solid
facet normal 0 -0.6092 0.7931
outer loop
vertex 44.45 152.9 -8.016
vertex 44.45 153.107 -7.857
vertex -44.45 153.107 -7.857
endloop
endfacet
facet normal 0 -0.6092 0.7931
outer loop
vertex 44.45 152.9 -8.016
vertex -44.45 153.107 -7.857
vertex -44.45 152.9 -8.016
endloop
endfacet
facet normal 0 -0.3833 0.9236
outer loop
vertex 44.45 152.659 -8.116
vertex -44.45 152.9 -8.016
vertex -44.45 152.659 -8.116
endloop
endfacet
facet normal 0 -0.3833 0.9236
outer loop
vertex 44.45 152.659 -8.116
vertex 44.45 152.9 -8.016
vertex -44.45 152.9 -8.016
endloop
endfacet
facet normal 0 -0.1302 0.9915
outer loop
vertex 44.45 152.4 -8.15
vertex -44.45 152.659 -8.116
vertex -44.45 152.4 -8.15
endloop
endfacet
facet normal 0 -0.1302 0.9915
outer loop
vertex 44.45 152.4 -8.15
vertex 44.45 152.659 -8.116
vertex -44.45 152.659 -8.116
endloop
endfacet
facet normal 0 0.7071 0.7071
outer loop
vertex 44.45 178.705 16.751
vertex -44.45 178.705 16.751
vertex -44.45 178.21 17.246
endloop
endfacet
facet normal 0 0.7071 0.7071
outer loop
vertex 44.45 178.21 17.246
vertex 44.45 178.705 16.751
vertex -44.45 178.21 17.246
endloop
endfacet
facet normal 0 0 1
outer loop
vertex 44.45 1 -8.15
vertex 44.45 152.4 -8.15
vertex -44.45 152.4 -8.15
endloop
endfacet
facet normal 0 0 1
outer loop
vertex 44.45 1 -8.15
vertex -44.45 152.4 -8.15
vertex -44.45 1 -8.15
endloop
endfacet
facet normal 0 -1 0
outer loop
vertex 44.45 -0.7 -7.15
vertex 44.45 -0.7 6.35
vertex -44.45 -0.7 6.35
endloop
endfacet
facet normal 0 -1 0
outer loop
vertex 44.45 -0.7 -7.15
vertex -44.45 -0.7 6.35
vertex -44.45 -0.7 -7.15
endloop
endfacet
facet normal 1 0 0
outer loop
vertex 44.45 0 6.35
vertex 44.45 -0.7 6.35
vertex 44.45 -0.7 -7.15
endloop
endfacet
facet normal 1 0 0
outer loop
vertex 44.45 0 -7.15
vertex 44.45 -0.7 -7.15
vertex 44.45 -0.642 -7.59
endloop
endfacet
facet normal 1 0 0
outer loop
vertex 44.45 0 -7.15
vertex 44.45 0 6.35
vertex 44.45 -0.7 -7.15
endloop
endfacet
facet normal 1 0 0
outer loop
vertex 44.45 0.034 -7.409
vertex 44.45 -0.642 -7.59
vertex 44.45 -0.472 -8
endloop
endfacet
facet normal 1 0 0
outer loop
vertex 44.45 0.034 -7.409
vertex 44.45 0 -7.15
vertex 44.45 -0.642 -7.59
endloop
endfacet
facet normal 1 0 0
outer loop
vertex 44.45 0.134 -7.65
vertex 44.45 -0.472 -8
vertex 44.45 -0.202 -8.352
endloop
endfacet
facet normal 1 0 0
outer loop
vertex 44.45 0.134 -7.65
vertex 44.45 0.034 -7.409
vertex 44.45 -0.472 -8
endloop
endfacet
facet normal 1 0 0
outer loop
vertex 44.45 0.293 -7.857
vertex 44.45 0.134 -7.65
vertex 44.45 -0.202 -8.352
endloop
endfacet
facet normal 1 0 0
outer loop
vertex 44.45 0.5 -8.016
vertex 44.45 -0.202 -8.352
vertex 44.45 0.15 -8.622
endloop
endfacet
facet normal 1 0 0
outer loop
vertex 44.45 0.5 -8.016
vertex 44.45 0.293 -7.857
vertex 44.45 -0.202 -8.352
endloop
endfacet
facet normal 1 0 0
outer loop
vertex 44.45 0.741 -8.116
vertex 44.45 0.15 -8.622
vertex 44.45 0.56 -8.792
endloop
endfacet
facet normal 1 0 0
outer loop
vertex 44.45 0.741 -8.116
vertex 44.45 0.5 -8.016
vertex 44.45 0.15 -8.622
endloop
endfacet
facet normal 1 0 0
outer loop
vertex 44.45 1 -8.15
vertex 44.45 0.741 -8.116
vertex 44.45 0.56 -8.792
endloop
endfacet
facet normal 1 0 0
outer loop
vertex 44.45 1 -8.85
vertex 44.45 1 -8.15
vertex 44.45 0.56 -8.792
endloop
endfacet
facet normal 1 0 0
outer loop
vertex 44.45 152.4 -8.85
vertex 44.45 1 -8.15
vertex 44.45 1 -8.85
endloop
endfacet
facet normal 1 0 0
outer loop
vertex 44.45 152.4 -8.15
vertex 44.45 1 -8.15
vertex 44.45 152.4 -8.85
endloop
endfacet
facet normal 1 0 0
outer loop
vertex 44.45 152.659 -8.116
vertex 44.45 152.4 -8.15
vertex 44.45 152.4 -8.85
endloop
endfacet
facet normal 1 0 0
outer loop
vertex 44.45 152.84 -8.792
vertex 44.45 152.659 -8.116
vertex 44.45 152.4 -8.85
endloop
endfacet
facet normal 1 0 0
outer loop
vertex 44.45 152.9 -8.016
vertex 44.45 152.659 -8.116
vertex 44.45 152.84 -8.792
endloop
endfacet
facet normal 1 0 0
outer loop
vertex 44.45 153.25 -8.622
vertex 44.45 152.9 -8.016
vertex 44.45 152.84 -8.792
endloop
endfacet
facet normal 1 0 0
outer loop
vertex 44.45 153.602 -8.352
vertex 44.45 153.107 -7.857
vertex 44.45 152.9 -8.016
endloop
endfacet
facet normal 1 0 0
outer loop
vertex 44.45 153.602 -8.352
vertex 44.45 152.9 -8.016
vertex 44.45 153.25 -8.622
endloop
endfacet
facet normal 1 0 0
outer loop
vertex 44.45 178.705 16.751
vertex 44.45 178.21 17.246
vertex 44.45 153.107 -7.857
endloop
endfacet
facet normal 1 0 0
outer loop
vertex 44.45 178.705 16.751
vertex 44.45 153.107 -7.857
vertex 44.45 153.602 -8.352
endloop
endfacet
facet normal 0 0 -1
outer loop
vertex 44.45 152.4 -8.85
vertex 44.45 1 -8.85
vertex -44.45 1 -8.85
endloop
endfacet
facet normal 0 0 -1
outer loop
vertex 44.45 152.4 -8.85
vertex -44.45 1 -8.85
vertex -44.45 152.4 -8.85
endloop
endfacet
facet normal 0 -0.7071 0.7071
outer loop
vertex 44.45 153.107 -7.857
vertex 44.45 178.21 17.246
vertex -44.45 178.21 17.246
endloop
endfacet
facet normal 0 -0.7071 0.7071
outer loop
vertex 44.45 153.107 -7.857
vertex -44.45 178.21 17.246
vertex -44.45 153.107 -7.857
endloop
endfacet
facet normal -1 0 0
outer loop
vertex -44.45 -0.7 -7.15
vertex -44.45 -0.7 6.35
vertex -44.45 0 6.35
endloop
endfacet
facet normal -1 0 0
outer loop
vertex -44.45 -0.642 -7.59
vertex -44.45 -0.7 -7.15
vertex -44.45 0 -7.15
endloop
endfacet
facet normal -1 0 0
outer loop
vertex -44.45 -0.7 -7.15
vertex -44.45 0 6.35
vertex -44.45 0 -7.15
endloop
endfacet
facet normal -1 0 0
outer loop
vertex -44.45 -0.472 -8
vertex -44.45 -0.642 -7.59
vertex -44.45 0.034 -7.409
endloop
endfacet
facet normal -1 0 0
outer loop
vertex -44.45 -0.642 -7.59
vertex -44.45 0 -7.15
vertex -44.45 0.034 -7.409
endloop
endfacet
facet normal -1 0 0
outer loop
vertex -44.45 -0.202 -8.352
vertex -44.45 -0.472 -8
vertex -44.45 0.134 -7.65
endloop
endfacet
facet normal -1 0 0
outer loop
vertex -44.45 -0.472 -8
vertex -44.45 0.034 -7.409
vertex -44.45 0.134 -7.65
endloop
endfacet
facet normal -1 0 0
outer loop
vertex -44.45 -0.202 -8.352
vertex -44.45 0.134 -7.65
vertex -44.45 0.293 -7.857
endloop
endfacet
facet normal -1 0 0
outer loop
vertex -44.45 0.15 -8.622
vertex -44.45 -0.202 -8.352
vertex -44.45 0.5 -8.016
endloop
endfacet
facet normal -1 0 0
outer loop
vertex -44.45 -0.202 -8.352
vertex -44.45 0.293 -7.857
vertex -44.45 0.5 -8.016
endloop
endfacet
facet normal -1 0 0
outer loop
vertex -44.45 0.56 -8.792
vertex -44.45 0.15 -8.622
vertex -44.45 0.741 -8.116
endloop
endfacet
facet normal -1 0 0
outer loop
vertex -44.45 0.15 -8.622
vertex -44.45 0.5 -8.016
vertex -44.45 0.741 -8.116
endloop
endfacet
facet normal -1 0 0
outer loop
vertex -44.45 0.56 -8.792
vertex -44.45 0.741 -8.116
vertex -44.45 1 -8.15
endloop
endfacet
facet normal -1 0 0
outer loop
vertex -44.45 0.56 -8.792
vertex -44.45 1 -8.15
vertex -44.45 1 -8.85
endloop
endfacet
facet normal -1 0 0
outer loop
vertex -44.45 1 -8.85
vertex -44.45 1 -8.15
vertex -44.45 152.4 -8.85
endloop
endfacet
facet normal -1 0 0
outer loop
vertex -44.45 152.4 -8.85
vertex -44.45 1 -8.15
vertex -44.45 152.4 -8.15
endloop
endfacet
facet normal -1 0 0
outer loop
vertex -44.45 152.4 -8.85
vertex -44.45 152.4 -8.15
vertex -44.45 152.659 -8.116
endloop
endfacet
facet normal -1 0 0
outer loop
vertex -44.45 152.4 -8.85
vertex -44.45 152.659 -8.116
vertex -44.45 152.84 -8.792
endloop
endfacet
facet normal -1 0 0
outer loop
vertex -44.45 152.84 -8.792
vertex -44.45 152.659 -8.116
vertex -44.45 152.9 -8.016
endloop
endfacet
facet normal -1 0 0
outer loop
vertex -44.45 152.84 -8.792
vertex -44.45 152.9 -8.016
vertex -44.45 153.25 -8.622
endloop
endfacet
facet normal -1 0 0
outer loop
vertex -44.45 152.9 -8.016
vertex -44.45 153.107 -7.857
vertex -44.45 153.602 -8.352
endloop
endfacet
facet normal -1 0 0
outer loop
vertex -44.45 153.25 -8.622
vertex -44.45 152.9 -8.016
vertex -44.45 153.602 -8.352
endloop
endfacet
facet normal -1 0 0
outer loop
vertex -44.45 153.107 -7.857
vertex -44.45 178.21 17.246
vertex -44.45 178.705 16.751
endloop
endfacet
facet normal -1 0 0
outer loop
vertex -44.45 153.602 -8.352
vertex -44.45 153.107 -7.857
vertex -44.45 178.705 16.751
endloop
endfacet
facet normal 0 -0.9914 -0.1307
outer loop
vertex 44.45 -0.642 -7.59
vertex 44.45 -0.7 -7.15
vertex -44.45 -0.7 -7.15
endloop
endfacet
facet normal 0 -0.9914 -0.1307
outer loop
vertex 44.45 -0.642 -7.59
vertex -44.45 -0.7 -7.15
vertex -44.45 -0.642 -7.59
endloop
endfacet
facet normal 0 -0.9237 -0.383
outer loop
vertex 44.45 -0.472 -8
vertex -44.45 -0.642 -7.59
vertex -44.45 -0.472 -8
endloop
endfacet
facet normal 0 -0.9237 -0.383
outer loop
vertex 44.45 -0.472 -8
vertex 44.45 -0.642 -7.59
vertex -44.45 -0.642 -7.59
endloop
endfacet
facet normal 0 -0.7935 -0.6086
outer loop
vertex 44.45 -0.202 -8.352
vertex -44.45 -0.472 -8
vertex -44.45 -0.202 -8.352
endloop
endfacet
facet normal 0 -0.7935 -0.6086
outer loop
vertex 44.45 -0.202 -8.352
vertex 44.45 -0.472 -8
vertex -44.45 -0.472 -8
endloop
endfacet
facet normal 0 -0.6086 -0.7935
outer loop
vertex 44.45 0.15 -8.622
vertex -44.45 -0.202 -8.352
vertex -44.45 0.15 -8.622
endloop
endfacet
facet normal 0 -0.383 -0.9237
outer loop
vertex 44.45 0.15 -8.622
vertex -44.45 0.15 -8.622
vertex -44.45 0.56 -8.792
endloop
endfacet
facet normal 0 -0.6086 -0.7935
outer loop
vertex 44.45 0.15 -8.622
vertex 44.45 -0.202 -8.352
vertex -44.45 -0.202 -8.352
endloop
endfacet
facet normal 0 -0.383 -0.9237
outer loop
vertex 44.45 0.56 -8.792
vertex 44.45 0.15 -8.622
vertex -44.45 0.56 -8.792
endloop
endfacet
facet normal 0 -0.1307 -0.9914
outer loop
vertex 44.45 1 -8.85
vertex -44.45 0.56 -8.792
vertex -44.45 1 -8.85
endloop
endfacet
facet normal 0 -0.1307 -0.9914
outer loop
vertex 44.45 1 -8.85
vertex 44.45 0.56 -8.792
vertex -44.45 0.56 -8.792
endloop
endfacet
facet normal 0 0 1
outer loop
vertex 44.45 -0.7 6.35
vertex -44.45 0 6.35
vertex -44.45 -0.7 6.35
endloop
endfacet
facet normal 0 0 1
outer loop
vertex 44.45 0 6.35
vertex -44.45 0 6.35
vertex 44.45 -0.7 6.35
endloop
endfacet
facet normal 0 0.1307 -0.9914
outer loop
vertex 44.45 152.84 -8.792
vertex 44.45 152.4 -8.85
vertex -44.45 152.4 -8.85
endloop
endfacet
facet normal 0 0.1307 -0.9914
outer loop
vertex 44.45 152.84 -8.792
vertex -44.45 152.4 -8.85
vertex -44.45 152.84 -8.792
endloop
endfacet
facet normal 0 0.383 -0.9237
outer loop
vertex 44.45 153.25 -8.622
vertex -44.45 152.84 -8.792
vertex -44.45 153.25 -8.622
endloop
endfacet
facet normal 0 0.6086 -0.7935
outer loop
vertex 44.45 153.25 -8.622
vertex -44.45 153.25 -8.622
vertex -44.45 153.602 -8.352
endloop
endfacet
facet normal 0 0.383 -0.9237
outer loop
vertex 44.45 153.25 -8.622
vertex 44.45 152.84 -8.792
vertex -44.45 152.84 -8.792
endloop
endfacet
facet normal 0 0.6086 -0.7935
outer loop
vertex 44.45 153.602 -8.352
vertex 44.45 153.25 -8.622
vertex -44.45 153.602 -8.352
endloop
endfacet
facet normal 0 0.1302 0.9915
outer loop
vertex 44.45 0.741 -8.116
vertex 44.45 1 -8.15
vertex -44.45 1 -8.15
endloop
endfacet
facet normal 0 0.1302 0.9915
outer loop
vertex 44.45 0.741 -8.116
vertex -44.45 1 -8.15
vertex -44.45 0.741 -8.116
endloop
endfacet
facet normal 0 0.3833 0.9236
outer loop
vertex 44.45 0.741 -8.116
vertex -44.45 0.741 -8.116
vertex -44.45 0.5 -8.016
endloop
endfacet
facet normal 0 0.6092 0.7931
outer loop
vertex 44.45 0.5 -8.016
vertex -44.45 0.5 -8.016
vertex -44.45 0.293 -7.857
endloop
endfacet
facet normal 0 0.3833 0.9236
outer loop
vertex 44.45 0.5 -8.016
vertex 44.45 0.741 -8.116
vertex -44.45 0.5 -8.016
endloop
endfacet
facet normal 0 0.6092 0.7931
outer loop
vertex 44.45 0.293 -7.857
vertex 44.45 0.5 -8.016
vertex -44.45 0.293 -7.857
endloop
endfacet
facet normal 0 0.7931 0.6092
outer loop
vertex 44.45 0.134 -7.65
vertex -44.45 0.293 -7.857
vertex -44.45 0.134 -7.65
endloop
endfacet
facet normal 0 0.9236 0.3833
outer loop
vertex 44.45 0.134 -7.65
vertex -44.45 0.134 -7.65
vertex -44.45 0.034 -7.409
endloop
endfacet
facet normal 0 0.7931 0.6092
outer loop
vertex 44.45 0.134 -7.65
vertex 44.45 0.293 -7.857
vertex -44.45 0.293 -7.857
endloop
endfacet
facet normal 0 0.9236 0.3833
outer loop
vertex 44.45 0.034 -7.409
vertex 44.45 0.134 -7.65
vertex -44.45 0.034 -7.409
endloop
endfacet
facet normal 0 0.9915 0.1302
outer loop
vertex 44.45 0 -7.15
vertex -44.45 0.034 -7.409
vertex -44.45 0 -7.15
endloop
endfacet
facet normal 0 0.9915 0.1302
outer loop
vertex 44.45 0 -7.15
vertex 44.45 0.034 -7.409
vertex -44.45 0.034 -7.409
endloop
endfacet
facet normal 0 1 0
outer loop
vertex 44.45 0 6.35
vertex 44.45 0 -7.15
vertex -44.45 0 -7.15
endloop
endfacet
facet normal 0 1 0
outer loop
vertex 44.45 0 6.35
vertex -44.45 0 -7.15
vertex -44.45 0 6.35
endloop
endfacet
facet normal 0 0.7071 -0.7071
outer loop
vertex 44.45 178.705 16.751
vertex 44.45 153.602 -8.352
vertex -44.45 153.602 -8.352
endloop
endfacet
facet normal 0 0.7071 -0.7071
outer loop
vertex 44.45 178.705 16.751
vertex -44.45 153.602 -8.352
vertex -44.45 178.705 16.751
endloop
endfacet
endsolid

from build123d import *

# Parameters (mm, degrees)
SKETCH1_W          = 88.9
SKETCH1_H          = 12.7
BASE_FLANGE1_DEPTH = 0.7
EDGE_FLANGE1_DEPTH = 88.9
EDGE_FLANGE2_DEPTH = 88.9


# Sheet-metal steps are written as plain solids
with BuildPart() as part:
    # Sketch1 → Base-Flange1 (new body)
    with BuildSketch(Plane(origin=(0, 0, 0), x_dir=(1, 0, 0), z_dir=(0, 1, 0))):
        Rectangle(SKETCH1_W, SKETCH1_H)
    extrude(amount=-BASE_FLANGE1_DEPTH)

    # Edge-Flange1 section (across the edge) → Edge-Flange1 (add)
    with BuildSketch(Plane(origin=(44.45, 0, -8.15), x_dir=(0, 0, 1), z_dir=(-1, 0, 0))):
        with BuildLine():
            Line((-0.7, 1), (-0.7, 152.4))
            Line((-0.7, 152.4), (0, 152.4))
            Line((0, 152.4), (0, 1))
            ThreePointArc((0, 1), (0.292893219, 0.292893219), (1, 0))
            Line((1, 0), (1.8, 0))
            Line((1.8, 0), (1.8, -0.7))
            Line((1.8, -0.7), (1, -0.7))
            ThreePointArc((1, -0.7), (-0.202081528, -0.202081528), (-0.7, 1))
        make_face()
    extrude(amount=EDGE_FLANGE1_DEPTH)

    # Edge-Flange2 section (across the edge) → Edge-Flange2 (add)
    with BuildSketch(Plane(origin=(44.45, 152.814213562, -8.15), x_dir=(0, -0.7071067811865414, 0.7071067811865537), z_dir=(-1, 0, 0))):
        with BuildLine():
            Line((-0.7, 0.414213562), (-0.7, 35.9156))
            Line((-0.7, 35.9156), (0, 35.9156))
            Line((0, 35.9156), (0, 0.414213562))
            ThreePointArc((0, 0.414213562), (0.076120467, 0.03153013), (0.292893219, -0.292893219))
            Line((0.292893219, -0.292893219), (-0.202081528, -0.787867966))
            ThreePointArc((-0.202081528, -0.787867966), (-0.570595205, -0.236348273), (-0.7, 0.414213562))
        make_face()
    extrude(amount=EDGE_FLANGE2_DEPTH)


solid = part.part
